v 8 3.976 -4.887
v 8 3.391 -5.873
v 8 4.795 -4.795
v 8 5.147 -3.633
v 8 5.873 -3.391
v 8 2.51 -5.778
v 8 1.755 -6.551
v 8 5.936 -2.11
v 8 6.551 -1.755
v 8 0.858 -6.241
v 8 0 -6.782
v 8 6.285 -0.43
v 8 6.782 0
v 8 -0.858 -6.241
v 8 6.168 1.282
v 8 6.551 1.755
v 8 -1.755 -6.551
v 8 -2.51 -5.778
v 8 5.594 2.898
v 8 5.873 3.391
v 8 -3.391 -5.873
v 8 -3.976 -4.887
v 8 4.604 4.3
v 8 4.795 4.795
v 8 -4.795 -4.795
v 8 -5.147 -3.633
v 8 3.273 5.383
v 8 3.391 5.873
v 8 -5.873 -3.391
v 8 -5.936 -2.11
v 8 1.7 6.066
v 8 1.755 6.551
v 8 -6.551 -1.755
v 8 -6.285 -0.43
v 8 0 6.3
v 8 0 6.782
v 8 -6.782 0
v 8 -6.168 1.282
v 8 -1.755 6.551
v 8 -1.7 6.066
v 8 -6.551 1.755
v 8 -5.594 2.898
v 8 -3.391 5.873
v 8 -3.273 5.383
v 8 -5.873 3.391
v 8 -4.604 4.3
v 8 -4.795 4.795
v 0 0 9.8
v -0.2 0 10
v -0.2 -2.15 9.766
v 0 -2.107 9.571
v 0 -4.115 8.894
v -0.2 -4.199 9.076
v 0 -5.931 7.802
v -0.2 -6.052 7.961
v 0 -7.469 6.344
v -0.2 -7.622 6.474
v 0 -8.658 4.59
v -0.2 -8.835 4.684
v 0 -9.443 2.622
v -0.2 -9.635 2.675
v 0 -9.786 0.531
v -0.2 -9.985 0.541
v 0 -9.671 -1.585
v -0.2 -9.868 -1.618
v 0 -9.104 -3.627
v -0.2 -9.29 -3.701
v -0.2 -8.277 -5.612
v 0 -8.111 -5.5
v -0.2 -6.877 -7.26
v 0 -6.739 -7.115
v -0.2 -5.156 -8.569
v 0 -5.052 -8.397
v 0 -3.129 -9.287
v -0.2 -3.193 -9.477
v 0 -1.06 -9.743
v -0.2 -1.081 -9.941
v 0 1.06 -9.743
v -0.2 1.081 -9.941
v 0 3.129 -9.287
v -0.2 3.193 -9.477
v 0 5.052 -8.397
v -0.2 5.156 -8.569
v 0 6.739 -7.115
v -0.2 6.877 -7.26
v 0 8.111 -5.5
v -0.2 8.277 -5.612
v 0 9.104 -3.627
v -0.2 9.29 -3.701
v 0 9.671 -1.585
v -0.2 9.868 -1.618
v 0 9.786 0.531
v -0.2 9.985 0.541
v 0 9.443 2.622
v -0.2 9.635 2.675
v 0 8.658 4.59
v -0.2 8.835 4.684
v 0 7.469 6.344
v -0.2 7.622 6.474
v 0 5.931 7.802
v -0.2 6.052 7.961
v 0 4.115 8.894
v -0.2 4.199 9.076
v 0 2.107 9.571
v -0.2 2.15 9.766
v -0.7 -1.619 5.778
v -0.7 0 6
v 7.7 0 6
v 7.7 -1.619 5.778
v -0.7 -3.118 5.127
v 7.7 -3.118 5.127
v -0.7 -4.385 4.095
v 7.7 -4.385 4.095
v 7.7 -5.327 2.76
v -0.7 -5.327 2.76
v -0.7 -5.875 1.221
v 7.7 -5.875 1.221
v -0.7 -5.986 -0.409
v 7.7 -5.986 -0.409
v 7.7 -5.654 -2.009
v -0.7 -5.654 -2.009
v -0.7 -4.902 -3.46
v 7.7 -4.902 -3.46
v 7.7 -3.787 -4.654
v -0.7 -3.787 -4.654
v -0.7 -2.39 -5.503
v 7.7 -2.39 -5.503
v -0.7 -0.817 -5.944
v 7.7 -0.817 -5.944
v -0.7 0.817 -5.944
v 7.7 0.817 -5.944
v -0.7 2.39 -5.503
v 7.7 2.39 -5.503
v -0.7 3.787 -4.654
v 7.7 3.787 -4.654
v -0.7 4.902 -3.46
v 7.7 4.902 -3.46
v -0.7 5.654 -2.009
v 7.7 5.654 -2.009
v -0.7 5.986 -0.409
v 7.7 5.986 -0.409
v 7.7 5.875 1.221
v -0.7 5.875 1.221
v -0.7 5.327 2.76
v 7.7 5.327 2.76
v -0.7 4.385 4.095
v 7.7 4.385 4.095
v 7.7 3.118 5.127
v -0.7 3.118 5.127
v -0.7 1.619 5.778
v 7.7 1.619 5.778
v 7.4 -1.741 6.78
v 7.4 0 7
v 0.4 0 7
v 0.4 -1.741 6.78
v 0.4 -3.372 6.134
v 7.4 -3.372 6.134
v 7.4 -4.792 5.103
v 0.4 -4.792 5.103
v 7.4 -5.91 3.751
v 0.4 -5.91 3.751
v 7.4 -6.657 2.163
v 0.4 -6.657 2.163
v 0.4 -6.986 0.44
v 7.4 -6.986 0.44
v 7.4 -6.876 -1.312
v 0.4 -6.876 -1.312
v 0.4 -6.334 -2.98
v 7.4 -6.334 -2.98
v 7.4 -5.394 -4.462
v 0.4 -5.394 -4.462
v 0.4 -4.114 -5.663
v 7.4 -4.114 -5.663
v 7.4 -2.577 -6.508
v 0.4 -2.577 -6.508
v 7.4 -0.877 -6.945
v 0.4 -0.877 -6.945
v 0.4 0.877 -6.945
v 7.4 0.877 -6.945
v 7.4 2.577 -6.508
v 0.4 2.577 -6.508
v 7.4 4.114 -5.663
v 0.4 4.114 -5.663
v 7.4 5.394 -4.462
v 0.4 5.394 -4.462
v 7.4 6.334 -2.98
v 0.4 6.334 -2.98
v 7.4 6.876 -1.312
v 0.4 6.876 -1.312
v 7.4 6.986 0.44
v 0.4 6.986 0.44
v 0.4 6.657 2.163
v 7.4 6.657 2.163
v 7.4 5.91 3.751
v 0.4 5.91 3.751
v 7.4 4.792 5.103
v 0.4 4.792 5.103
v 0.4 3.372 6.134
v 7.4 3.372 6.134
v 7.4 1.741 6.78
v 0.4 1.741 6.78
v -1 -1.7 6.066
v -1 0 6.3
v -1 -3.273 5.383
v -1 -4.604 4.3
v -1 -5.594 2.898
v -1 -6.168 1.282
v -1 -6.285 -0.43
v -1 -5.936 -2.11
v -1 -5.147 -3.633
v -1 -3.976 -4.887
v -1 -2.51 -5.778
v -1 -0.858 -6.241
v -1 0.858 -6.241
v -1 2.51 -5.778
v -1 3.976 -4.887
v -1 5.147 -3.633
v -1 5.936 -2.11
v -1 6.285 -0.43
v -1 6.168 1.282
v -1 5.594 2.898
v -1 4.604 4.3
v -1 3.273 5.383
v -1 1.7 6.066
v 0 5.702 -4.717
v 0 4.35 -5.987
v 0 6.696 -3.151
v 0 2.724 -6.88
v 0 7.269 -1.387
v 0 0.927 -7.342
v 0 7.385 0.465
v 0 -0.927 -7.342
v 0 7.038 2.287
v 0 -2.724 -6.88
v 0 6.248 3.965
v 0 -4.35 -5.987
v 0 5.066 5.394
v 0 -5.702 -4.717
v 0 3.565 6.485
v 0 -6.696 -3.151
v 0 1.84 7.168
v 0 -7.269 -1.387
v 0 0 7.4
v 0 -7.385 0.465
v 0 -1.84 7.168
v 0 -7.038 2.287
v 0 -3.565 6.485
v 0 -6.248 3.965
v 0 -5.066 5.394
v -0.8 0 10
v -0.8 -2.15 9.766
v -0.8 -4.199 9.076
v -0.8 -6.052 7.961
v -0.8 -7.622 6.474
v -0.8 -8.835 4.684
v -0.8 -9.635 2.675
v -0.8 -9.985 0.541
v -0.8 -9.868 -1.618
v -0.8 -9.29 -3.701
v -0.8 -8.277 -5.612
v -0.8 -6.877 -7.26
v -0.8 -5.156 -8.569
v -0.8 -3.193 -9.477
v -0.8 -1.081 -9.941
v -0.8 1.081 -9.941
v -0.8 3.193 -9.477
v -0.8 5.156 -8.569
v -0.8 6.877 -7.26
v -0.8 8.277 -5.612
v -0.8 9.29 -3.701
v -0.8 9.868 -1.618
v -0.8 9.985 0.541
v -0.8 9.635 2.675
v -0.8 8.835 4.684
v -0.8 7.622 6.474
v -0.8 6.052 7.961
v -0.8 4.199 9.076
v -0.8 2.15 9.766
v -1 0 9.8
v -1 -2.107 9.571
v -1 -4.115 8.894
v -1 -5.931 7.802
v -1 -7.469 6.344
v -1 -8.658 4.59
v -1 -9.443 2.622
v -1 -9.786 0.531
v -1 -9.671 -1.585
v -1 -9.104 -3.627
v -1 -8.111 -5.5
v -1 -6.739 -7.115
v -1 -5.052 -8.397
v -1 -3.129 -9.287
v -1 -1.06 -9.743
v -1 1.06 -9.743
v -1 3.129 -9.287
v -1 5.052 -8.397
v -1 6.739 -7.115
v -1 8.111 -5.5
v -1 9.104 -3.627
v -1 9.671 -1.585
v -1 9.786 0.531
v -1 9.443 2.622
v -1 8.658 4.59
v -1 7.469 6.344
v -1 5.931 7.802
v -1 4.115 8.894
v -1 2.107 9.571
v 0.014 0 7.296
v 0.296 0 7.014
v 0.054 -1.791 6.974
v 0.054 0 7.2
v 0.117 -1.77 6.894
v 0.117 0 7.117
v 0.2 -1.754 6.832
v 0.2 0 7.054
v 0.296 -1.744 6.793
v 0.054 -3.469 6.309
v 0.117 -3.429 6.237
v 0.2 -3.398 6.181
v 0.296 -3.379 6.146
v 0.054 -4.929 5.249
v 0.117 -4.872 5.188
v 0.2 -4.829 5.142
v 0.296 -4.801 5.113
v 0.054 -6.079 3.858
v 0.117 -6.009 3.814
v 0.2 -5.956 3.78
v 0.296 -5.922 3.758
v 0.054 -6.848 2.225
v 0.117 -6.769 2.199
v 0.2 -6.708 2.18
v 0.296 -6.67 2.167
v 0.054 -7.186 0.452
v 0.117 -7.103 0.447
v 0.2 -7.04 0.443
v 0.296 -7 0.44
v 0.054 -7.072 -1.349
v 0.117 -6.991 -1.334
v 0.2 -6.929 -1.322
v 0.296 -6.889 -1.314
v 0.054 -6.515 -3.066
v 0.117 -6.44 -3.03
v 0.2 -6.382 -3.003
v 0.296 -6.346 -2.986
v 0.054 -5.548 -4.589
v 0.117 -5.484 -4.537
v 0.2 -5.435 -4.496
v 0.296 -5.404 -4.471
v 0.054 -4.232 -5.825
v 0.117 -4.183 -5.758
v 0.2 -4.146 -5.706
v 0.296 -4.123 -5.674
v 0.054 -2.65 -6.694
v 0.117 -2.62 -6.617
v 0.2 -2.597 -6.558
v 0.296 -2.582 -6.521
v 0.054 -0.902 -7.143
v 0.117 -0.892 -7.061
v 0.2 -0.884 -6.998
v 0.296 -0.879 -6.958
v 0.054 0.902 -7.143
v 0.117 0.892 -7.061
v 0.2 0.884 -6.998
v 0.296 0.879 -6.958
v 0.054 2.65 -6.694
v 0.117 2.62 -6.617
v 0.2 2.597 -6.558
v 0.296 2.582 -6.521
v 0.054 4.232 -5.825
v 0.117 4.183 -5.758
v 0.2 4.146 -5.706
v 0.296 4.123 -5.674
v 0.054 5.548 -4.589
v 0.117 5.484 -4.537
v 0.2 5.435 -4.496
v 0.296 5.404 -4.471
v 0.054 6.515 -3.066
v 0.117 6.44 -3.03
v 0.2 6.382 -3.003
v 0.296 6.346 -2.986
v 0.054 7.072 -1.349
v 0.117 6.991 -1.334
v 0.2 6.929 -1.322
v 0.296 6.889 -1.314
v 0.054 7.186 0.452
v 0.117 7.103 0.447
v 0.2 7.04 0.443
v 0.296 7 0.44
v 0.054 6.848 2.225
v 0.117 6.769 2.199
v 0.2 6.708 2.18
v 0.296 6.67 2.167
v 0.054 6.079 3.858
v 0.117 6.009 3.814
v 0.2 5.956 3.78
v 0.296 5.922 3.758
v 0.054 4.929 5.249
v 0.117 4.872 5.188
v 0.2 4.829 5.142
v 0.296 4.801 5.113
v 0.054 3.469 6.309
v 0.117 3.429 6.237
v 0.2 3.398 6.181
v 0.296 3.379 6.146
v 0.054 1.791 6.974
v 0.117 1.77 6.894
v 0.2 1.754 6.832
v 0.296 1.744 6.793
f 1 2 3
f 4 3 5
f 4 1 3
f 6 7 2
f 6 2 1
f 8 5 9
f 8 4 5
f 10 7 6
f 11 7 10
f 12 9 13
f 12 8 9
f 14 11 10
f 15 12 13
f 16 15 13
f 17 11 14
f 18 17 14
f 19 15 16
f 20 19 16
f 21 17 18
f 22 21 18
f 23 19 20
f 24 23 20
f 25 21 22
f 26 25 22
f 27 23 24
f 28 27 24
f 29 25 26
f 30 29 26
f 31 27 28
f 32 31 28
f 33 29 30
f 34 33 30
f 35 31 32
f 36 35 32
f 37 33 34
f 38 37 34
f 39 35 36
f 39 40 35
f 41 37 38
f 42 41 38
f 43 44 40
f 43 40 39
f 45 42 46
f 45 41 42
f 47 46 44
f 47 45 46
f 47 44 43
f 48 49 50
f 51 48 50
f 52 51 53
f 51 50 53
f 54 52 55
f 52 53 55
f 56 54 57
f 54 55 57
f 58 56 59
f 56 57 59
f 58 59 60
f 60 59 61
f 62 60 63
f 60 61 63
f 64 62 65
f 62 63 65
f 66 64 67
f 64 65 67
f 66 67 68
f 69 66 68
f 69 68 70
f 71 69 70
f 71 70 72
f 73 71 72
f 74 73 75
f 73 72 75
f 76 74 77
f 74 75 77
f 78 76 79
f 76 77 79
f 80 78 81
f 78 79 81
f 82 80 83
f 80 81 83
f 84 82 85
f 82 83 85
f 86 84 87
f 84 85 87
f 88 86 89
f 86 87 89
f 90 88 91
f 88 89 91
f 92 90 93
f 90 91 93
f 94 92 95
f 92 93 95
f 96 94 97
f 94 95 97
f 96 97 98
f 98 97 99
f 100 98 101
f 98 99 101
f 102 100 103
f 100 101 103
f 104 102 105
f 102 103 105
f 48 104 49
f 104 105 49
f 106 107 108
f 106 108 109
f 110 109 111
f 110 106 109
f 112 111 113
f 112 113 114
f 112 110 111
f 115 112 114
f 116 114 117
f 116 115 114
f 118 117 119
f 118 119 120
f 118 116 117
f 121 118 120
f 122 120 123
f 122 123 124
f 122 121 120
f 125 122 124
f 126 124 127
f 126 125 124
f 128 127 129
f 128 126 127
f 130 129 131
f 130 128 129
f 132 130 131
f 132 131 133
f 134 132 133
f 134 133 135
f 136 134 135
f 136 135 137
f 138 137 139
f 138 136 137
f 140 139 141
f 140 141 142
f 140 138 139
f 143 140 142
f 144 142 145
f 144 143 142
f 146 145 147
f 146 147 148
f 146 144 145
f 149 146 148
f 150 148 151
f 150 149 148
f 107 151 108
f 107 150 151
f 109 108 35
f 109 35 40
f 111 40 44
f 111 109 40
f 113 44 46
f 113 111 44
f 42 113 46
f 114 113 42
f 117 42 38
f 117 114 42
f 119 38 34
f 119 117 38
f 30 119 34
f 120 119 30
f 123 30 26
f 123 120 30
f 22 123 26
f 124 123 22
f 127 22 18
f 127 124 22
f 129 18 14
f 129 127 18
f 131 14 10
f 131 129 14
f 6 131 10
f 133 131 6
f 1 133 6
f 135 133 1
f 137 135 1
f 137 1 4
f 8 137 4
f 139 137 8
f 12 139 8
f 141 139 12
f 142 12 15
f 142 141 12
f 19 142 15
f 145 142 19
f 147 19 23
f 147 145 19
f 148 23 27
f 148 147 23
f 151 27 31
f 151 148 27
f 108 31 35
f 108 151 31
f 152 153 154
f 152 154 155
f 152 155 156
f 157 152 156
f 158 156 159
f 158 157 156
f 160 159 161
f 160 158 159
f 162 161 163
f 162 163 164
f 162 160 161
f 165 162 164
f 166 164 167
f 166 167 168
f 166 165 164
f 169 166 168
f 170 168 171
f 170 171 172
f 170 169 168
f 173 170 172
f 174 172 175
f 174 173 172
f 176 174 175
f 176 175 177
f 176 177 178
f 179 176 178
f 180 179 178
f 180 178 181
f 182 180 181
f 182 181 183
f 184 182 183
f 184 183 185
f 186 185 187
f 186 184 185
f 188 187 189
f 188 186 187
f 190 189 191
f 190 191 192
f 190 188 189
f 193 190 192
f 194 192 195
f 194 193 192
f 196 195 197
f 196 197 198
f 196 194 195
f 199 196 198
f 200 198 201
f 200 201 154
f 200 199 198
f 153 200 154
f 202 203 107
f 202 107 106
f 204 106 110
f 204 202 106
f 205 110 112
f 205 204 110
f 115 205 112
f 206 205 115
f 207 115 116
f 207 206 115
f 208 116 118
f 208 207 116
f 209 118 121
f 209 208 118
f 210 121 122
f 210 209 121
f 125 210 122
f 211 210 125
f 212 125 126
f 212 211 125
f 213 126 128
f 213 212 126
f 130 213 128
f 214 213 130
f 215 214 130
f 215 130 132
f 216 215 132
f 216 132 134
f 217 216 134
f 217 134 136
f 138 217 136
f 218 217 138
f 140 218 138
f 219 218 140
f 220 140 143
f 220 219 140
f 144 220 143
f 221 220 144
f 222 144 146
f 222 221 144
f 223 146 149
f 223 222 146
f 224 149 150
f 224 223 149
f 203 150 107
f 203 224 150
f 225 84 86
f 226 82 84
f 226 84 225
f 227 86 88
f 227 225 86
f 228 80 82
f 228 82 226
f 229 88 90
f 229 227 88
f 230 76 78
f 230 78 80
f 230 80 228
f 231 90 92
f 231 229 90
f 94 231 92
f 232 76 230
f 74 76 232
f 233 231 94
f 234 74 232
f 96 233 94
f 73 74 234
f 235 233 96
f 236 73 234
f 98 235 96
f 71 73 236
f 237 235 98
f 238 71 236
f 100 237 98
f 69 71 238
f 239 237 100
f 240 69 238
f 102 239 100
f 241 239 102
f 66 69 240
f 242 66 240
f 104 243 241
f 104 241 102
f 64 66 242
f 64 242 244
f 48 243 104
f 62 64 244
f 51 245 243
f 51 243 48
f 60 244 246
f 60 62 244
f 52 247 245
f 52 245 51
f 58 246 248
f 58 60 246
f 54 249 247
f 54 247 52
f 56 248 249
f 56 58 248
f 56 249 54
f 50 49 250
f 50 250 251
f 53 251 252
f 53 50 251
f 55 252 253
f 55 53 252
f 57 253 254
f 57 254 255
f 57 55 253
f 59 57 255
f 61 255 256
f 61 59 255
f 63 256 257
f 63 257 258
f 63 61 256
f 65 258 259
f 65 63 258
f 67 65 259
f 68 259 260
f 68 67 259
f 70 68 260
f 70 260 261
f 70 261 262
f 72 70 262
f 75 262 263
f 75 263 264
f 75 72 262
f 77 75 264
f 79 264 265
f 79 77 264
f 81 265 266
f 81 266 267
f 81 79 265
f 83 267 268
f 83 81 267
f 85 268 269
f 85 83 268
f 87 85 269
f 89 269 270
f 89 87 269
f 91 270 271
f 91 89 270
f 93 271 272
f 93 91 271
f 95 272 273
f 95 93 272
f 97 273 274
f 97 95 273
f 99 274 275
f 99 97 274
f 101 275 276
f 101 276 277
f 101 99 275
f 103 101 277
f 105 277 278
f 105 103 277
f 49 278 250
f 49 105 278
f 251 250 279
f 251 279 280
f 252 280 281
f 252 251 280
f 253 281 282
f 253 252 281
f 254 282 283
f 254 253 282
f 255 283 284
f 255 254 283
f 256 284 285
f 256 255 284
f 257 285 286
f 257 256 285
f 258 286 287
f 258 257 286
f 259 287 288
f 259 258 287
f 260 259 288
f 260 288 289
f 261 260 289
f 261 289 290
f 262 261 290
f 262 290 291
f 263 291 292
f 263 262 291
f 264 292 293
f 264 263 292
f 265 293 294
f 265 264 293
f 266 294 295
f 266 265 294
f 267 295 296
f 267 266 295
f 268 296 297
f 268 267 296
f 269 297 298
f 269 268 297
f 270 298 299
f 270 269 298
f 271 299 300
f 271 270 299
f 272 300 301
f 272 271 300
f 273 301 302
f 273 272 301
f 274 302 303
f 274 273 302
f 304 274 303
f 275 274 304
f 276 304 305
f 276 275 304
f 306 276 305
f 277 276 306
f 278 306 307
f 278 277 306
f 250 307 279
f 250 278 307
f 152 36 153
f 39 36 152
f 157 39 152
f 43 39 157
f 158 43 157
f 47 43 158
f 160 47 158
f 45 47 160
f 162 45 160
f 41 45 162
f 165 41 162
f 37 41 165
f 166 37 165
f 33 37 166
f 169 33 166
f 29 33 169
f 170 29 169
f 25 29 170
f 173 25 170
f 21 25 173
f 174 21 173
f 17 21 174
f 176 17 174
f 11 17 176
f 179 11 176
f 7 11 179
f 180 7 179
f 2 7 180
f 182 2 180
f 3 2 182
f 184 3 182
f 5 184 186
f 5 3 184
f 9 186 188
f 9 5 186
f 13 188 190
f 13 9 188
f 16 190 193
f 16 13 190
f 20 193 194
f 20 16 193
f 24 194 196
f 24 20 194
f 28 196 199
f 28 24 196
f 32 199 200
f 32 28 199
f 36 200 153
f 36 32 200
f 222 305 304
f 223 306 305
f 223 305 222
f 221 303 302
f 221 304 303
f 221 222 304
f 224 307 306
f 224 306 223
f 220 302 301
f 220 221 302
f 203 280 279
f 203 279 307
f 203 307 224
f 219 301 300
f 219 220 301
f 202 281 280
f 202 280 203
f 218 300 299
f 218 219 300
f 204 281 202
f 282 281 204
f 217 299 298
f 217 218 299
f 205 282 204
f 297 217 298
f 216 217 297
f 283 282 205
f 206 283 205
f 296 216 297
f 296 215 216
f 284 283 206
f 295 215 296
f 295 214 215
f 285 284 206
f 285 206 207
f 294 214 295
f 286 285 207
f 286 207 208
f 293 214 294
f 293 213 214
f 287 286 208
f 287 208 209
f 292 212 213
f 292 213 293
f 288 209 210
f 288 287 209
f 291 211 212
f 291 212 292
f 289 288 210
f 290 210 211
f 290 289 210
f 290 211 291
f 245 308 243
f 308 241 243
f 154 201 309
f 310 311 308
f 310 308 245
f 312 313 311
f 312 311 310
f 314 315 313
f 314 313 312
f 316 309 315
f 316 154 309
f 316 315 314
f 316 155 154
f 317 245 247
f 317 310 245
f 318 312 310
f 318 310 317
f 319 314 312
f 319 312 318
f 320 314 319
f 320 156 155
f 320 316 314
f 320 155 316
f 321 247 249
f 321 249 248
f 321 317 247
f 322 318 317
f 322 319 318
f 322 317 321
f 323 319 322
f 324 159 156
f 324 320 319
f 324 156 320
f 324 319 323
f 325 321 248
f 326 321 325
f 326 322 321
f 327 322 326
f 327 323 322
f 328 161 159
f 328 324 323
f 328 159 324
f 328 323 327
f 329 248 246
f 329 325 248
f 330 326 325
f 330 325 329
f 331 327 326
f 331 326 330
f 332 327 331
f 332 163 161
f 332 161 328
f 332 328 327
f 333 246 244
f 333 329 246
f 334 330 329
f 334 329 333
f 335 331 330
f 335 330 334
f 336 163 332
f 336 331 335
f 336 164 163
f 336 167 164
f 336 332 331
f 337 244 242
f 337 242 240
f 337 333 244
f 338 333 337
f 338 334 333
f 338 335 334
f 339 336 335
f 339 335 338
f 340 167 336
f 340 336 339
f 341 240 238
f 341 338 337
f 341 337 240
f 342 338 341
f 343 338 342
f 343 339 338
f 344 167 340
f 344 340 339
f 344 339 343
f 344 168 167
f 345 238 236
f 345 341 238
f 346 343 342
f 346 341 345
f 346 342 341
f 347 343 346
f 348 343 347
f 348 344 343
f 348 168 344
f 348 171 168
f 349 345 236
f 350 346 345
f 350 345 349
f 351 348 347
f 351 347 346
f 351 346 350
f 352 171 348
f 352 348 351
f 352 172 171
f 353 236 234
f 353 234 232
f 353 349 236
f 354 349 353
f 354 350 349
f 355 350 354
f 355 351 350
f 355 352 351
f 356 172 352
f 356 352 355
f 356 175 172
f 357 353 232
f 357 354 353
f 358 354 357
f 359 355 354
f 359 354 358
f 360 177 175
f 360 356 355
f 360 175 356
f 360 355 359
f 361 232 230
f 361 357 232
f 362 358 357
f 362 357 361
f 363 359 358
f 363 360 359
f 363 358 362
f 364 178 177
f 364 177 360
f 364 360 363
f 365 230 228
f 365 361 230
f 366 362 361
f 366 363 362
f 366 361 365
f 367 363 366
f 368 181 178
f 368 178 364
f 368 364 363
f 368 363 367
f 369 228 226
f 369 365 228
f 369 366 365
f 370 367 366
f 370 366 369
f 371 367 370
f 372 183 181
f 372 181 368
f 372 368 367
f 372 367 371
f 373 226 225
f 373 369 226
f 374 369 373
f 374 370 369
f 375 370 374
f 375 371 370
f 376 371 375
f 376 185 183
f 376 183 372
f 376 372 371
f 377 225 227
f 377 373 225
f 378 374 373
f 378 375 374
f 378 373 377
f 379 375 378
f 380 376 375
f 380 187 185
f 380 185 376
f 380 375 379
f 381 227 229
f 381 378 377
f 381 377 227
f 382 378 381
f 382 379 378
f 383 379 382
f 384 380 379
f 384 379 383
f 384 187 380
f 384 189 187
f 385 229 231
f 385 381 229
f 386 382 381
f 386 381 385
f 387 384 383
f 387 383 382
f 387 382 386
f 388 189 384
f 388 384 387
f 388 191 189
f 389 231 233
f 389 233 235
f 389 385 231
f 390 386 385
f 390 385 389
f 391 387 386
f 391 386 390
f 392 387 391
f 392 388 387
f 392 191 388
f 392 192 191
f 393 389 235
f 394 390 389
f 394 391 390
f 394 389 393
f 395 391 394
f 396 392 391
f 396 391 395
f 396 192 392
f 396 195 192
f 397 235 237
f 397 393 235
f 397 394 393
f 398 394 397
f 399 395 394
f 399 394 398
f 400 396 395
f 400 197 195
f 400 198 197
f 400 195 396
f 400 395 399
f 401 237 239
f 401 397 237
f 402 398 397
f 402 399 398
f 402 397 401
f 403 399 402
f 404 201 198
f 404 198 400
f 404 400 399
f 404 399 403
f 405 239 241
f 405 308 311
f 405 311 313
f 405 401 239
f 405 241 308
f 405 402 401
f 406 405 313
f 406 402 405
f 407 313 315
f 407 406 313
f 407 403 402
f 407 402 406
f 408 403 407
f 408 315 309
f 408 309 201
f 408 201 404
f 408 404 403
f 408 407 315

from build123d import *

# Parameters (mm, degrees)
CHANFREIN2_SIZE  = 0.6
CHANFREIN2_SIZE2 = 0.218382141
CHANFREIN3_SIZE  = 0.3
CHANFREIN4_SIZE  = 0.2
CONG_1_R         = 0.4


with BuildPart() as part:
    # Esquisse1 → Base-Révolution (revolve)
    with BuildSketch(Plane.XY, mode=Mode.PRIVATE) as base_r_volution_sk:
        Polygon((-1, 6), (-1, 10), (0, 10), (0, 7), (8, 7), (8, 6), align=None)
    revolve(base_r_volution_sk.sketch.rotate(Axis((-5.312682662, 0, 0), (1, 0, 0)), 90), axis=Axis((-5.312682662, 0, 0), (1, 0, 0)))

    # Chanfrein2
    chanfrein2_edges = [part.edges().sort_by_distance(p)[0] for p in [
        (8, 0, -7),
    ]]
    chanfrein2_side = [part.faces().sort_by_distance(p)[0] for p in [
        (4, 0, -7),
    ]]
    chamfer(chanfrein2_edges, length=CHANFREIN2_SIZE, length2=CHANFREIN2_SIZE2, reference=chanfrein2_side[0])

    # Chanfrein3
    chanfrein3_edges = [part.edges().sort_by_distance(p)[0] for p in [
        (-1, 0, -6),
        (8, 0, -6),
    ]]
    chamfer(chanfrein3_edges, length=CHANFREIN3_SIZE)

    # Chanfrein4
    chanfrein4_edges = [part.edges().sort_by_distance(p)[0] for p in [
        (0, 0, -10),
        (-1, 0, -10),
    ]]
    chamfer(chanfrein4_edges, length=CHANFREIN4_SIZE)

    # Congé1
    cong_1_edges = [part.edges().sort_by_distance(p)[0] for p in [
        (0, 0, -7),
    ]]
    fillet(cong_1_edges, radius=CONG_1_R)


solid = part.part
